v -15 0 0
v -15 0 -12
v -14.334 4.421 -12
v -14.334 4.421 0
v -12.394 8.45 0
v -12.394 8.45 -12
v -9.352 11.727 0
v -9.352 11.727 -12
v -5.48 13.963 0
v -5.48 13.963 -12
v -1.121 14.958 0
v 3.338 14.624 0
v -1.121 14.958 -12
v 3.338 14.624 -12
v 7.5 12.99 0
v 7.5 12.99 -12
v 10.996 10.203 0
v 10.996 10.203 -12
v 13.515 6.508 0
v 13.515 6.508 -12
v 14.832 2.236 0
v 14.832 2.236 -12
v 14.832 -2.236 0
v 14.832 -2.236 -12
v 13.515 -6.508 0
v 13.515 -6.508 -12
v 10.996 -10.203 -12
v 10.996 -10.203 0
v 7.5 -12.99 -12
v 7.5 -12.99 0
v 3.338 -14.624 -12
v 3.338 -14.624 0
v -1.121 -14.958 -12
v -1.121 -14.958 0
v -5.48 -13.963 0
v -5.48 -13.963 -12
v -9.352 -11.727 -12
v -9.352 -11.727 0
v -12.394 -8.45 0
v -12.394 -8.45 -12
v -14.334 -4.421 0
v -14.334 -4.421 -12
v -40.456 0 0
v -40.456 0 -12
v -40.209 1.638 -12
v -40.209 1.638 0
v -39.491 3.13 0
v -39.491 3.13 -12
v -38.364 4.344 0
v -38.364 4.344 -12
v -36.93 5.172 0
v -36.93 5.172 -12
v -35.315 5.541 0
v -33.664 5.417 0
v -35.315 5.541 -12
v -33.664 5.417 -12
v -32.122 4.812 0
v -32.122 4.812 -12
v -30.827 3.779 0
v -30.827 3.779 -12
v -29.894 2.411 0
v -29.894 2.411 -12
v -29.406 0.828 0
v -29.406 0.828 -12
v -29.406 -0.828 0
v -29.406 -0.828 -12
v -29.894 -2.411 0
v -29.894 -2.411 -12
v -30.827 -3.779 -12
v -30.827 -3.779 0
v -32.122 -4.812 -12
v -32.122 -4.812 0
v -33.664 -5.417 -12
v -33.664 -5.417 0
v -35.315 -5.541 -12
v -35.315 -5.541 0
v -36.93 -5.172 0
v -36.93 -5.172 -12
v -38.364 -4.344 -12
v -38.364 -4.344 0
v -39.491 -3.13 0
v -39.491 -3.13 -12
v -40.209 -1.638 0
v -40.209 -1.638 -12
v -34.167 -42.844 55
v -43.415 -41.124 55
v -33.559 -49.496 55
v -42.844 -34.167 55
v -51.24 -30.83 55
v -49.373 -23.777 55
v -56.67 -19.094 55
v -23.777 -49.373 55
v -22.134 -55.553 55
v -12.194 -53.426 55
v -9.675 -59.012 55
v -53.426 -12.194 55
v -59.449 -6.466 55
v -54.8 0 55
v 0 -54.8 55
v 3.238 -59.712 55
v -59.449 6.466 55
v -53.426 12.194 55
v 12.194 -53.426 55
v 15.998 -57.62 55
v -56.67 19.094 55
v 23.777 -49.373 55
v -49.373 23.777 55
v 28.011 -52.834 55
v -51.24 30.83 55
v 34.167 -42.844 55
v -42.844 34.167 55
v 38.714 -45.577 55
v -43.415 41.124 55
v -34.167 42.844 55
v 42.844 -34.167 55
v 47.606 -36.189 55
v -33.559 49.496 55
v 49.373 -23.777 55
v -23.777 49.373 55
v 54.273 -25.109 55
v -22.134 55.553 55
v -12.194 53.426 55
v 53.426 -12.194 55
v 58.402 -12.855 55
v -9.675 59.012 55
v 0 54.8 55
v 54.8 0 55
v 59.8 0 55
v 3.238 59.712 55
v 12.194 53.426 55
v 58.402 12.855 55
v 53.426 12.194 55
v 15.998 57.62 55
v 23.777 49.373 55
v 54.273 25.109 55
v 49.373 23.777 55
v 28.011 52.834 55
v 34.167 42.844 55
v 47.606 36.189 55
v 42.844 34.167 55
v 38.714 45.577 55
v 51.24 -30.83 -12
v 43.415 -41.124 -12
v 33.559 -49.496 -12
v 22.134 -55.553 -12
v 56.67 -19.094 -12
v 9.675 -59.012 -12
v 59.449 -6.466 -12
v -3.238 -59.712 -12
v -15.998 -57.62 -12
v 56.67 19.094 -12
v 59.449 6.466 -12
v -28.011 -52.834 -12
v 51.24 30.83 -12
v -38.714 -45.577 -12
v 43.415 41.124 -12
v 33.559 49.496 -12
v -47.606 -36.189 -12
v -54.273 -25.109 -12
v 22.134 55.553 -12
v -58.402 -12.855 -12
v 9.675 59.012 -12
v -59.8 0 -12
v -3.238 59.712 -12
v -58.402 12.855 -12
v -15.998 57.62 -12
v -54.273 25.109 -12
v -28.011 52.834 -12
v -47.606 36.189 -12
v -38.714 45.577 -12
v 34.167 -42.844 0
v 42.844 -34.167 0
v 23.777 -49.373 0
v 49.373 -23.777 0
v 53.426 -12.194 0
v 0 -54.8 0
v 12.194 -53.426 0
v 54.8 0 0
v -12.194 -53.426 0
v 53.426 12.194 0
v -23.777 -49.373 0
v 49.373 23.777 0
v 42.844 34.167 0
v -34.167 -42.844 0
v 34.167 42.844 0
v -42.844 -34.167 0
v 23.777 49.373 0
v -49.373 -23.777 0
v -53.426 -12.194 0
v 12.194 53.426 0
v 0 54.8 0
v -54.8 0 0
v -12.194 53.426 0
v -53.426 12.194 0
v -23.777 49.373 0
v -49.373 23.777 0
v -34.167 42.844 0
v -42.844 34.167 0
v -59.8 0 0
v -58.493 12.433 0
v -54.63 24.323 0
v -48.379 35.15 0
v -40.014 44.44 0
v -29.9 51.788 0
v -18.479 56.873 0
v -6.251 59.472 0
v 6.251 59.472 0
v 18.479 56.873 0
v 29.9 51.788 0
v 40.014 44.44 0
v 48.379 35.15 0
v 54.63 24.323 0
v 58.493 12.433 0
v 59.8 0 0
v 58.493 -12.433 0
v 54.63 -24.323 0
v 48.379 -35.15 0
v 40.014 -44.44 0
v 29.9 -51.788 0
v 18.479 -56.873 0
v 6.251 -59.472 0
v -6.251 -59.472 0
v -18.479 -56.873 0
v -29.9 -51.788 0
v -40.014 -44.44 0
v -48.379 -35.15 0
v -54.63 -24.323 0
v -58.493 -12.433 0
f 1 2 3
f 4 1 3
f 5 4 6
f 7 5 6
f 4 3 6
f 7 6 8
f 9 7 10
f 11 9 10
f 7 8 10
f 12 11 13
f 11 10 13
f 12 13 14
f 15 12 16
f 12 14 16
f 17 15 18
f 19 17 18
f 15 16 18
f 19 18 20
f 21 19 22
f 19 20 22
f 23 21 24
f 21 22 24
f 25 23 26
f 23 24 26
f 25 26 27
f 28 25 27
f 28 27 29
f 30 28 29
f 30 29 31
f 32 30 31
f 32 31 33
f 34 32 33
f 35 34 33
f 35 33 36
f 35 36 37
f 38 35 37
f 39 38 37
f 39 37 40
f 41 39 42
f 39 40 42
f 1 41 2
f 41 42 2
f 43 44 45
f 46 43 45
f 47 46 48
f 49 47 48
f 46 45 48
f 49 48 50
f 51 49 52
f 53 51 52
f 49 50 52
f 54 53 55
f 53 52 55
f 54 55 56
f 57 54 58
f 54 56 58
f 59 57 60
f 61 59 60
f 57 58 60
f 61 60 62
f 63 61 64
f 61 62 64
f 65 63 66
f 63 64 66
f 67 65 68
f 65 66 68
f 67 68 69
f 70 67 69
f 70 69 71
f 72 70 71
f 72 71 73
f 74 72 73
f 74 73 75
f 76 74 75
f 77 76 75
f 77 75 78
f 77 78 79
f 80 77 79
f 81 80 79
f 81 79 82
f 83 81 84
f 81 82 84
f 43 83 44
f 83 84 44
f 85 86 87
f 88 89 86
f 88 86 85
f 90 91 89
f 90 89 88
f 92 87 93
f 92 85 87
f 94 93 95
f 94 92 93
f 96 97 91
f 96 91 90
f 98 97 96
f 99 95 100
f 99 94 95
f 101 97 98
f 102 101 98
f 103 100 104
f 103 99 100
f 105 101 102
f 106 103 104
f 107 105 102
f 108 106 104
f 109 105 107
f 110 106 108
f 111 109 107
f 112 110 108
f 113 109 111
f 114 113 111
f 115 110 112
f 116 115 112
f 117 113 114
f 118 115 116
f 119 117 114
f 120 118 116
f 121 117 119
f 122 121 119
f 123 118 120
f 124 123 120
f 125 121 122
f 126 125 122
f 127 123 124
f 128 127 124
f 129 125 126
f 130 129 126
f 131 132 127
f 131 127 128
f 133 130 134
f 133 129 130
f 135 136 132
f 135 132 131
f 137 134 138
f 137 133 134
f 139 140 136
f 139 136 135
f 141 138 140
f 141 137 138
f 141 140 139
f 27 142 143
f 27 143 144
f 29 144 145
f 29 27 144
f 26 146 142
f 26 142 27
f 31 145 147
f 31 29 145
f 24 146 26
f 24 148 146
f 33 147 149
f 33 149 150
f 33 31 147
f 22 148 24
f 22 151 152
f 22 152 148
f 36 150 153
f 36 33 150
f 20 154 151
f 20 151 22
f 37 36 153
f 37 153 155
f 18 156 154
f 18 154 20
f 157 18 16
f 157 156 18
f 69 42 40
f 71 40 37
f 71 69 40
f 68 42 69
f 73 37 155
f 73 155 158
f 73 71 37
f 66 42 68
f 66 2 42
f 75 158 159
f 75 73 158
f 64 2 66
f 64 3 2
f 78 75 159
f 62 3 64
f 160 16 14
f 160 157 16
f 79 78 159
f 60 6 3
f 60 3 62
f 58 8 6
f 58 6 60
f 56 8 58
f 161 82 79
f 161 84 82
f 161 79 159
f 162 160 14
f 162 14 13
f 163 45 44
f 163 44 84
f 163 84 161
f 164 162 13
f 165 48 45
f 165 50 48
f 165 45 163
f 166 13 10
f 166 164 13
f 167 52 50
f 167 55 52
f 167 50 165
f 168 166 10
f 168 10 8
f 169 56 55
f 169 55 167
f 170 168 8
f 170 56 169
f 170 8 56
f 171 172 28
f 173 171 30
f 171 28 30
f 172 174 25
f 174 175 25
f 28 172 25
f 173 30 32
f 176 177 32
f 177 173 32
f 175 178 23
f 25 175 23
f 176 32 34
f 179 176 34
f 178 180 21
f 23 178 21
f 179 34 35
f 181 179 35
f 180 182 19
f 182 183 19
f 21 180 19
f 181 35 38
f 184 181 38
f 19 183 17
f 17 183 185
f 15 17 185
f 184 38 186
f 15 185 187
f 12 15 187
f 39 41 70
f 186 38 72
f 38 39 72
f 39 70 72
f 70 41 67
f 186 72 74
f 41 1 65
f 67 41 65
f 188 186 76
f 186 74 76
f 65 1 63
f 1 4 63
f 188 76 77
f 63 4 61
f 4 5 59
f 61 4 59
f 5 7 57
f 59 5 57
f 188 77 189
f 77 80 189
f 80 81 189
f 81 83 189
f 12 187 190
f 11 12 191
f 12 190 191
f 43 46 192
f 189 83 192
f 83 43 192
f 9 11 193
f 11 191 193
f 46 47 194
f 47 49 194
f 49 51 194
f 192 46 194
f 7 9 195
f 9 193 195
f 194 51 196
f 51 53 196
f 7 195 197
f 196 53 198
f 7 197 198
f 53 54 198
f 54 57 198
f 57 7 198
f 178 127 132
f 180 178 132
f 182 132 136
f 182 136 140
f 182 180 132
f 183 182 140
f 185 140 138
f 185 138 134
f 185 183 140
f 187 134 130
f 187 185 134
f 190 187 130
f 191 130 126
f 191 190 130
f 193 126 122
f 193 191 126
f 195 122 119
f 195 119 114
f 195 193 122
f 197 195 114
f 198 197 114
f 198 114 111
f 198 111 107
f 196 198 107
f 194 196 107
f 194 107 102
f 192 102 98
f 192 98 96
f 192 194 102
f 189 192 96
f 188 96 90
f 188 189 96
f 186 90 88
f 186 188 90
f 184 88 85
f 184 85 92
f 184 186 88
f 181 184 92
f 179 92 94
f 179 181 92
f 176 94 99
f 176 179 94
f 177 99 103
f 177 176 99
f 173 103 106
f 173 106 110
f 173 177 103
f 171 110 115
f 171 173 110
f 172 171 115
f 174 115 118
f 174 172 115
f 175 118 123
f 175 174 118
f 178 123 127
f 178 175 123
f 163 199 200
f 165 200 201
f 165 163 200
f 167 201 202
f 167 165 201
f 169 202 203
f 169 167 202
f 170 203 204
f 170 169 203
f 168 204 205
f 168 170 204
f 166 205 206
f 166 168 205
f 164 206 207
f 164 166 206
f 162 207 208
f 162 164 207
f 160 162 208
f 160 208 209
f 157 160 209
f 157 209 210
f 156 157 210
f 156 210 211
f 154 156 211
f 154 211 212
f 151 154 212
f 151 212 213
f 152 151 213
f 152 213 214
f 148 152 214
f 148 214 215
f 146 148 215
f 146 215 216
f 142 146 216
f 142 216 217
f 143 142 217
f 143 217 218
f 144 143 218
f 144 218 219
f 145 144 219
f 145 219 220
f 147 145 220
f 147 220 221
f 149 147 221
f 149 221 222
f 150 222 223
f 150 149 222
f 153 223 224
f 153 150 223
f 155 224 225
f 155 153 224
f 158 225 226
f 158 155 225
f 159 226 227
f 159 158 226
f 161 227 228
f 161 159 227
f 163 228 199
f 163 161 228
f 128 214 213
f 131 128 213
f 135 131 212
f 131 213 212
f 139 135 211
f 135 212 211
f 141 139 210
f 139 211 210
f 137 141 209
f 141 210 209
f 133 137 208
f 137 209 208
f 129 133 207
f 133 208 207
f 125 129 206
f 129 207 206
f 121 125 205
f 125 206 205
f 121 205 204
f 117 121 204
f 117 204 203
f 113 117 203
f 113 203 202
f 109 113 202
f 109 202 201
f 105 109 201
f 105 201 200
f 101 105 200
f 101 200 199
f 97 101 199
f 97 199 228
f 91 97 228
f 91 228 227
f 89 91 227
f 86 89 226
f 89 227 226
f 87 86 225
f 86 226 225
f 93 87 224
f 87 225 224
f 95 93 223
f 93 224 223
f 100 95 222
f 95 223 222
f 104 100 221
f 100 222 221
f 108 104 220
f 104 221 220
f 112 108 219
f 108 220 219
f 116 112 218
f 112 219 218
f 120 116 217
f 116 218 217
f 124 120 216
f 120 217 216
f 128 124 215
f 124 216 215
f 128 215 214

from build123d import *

# Parameters (mm, degrees)
SKETCH1_R           = 59.8
SKETCH1_R_2         = 54.8
BOSS_EXTRUDE1_DEPTH = 55
BOSS_EXTRUDE2_START = 12
SKETCH2_R           = 59.8
SKETCH2_R_2         = 15
SKETCH2_R_3         = 5.55625
BOSS_EXTRUDE2_DEPTH = 12


with BuildPart() as part:
    # Sketch1 → Boss-Extrude1 (new body)
    with BuildSketch(Plane.XY):
        Circle(SKETCH1_R)
        Circle(SKETCH1_R_2, mode=Mode.SUBTRACT)
    extrude(amount=BOSS_EXTRUDE1_DEPTH)

    # Sketch2 → Boss-Extrude2 (add)
    with BuildSketch(Plane(origin=(0, 0, 0), x_dir=(-1, 0, 0), z_dir=(0, 0, -1)).offset(BOSS_EXTRUDE2_START)):
        Circle(SKETCH2_R)
        Circle(SKETCH2_R_2, mode=Mode.SUBTRACT)
        with Locations((34.9, 0)):
            Circle(SKETCH2_R_3, mode=Mode.SUBTRACT)
    extrude(amount=-BOSS_EXTRUDE2_DEPTH)


solid = part.part
